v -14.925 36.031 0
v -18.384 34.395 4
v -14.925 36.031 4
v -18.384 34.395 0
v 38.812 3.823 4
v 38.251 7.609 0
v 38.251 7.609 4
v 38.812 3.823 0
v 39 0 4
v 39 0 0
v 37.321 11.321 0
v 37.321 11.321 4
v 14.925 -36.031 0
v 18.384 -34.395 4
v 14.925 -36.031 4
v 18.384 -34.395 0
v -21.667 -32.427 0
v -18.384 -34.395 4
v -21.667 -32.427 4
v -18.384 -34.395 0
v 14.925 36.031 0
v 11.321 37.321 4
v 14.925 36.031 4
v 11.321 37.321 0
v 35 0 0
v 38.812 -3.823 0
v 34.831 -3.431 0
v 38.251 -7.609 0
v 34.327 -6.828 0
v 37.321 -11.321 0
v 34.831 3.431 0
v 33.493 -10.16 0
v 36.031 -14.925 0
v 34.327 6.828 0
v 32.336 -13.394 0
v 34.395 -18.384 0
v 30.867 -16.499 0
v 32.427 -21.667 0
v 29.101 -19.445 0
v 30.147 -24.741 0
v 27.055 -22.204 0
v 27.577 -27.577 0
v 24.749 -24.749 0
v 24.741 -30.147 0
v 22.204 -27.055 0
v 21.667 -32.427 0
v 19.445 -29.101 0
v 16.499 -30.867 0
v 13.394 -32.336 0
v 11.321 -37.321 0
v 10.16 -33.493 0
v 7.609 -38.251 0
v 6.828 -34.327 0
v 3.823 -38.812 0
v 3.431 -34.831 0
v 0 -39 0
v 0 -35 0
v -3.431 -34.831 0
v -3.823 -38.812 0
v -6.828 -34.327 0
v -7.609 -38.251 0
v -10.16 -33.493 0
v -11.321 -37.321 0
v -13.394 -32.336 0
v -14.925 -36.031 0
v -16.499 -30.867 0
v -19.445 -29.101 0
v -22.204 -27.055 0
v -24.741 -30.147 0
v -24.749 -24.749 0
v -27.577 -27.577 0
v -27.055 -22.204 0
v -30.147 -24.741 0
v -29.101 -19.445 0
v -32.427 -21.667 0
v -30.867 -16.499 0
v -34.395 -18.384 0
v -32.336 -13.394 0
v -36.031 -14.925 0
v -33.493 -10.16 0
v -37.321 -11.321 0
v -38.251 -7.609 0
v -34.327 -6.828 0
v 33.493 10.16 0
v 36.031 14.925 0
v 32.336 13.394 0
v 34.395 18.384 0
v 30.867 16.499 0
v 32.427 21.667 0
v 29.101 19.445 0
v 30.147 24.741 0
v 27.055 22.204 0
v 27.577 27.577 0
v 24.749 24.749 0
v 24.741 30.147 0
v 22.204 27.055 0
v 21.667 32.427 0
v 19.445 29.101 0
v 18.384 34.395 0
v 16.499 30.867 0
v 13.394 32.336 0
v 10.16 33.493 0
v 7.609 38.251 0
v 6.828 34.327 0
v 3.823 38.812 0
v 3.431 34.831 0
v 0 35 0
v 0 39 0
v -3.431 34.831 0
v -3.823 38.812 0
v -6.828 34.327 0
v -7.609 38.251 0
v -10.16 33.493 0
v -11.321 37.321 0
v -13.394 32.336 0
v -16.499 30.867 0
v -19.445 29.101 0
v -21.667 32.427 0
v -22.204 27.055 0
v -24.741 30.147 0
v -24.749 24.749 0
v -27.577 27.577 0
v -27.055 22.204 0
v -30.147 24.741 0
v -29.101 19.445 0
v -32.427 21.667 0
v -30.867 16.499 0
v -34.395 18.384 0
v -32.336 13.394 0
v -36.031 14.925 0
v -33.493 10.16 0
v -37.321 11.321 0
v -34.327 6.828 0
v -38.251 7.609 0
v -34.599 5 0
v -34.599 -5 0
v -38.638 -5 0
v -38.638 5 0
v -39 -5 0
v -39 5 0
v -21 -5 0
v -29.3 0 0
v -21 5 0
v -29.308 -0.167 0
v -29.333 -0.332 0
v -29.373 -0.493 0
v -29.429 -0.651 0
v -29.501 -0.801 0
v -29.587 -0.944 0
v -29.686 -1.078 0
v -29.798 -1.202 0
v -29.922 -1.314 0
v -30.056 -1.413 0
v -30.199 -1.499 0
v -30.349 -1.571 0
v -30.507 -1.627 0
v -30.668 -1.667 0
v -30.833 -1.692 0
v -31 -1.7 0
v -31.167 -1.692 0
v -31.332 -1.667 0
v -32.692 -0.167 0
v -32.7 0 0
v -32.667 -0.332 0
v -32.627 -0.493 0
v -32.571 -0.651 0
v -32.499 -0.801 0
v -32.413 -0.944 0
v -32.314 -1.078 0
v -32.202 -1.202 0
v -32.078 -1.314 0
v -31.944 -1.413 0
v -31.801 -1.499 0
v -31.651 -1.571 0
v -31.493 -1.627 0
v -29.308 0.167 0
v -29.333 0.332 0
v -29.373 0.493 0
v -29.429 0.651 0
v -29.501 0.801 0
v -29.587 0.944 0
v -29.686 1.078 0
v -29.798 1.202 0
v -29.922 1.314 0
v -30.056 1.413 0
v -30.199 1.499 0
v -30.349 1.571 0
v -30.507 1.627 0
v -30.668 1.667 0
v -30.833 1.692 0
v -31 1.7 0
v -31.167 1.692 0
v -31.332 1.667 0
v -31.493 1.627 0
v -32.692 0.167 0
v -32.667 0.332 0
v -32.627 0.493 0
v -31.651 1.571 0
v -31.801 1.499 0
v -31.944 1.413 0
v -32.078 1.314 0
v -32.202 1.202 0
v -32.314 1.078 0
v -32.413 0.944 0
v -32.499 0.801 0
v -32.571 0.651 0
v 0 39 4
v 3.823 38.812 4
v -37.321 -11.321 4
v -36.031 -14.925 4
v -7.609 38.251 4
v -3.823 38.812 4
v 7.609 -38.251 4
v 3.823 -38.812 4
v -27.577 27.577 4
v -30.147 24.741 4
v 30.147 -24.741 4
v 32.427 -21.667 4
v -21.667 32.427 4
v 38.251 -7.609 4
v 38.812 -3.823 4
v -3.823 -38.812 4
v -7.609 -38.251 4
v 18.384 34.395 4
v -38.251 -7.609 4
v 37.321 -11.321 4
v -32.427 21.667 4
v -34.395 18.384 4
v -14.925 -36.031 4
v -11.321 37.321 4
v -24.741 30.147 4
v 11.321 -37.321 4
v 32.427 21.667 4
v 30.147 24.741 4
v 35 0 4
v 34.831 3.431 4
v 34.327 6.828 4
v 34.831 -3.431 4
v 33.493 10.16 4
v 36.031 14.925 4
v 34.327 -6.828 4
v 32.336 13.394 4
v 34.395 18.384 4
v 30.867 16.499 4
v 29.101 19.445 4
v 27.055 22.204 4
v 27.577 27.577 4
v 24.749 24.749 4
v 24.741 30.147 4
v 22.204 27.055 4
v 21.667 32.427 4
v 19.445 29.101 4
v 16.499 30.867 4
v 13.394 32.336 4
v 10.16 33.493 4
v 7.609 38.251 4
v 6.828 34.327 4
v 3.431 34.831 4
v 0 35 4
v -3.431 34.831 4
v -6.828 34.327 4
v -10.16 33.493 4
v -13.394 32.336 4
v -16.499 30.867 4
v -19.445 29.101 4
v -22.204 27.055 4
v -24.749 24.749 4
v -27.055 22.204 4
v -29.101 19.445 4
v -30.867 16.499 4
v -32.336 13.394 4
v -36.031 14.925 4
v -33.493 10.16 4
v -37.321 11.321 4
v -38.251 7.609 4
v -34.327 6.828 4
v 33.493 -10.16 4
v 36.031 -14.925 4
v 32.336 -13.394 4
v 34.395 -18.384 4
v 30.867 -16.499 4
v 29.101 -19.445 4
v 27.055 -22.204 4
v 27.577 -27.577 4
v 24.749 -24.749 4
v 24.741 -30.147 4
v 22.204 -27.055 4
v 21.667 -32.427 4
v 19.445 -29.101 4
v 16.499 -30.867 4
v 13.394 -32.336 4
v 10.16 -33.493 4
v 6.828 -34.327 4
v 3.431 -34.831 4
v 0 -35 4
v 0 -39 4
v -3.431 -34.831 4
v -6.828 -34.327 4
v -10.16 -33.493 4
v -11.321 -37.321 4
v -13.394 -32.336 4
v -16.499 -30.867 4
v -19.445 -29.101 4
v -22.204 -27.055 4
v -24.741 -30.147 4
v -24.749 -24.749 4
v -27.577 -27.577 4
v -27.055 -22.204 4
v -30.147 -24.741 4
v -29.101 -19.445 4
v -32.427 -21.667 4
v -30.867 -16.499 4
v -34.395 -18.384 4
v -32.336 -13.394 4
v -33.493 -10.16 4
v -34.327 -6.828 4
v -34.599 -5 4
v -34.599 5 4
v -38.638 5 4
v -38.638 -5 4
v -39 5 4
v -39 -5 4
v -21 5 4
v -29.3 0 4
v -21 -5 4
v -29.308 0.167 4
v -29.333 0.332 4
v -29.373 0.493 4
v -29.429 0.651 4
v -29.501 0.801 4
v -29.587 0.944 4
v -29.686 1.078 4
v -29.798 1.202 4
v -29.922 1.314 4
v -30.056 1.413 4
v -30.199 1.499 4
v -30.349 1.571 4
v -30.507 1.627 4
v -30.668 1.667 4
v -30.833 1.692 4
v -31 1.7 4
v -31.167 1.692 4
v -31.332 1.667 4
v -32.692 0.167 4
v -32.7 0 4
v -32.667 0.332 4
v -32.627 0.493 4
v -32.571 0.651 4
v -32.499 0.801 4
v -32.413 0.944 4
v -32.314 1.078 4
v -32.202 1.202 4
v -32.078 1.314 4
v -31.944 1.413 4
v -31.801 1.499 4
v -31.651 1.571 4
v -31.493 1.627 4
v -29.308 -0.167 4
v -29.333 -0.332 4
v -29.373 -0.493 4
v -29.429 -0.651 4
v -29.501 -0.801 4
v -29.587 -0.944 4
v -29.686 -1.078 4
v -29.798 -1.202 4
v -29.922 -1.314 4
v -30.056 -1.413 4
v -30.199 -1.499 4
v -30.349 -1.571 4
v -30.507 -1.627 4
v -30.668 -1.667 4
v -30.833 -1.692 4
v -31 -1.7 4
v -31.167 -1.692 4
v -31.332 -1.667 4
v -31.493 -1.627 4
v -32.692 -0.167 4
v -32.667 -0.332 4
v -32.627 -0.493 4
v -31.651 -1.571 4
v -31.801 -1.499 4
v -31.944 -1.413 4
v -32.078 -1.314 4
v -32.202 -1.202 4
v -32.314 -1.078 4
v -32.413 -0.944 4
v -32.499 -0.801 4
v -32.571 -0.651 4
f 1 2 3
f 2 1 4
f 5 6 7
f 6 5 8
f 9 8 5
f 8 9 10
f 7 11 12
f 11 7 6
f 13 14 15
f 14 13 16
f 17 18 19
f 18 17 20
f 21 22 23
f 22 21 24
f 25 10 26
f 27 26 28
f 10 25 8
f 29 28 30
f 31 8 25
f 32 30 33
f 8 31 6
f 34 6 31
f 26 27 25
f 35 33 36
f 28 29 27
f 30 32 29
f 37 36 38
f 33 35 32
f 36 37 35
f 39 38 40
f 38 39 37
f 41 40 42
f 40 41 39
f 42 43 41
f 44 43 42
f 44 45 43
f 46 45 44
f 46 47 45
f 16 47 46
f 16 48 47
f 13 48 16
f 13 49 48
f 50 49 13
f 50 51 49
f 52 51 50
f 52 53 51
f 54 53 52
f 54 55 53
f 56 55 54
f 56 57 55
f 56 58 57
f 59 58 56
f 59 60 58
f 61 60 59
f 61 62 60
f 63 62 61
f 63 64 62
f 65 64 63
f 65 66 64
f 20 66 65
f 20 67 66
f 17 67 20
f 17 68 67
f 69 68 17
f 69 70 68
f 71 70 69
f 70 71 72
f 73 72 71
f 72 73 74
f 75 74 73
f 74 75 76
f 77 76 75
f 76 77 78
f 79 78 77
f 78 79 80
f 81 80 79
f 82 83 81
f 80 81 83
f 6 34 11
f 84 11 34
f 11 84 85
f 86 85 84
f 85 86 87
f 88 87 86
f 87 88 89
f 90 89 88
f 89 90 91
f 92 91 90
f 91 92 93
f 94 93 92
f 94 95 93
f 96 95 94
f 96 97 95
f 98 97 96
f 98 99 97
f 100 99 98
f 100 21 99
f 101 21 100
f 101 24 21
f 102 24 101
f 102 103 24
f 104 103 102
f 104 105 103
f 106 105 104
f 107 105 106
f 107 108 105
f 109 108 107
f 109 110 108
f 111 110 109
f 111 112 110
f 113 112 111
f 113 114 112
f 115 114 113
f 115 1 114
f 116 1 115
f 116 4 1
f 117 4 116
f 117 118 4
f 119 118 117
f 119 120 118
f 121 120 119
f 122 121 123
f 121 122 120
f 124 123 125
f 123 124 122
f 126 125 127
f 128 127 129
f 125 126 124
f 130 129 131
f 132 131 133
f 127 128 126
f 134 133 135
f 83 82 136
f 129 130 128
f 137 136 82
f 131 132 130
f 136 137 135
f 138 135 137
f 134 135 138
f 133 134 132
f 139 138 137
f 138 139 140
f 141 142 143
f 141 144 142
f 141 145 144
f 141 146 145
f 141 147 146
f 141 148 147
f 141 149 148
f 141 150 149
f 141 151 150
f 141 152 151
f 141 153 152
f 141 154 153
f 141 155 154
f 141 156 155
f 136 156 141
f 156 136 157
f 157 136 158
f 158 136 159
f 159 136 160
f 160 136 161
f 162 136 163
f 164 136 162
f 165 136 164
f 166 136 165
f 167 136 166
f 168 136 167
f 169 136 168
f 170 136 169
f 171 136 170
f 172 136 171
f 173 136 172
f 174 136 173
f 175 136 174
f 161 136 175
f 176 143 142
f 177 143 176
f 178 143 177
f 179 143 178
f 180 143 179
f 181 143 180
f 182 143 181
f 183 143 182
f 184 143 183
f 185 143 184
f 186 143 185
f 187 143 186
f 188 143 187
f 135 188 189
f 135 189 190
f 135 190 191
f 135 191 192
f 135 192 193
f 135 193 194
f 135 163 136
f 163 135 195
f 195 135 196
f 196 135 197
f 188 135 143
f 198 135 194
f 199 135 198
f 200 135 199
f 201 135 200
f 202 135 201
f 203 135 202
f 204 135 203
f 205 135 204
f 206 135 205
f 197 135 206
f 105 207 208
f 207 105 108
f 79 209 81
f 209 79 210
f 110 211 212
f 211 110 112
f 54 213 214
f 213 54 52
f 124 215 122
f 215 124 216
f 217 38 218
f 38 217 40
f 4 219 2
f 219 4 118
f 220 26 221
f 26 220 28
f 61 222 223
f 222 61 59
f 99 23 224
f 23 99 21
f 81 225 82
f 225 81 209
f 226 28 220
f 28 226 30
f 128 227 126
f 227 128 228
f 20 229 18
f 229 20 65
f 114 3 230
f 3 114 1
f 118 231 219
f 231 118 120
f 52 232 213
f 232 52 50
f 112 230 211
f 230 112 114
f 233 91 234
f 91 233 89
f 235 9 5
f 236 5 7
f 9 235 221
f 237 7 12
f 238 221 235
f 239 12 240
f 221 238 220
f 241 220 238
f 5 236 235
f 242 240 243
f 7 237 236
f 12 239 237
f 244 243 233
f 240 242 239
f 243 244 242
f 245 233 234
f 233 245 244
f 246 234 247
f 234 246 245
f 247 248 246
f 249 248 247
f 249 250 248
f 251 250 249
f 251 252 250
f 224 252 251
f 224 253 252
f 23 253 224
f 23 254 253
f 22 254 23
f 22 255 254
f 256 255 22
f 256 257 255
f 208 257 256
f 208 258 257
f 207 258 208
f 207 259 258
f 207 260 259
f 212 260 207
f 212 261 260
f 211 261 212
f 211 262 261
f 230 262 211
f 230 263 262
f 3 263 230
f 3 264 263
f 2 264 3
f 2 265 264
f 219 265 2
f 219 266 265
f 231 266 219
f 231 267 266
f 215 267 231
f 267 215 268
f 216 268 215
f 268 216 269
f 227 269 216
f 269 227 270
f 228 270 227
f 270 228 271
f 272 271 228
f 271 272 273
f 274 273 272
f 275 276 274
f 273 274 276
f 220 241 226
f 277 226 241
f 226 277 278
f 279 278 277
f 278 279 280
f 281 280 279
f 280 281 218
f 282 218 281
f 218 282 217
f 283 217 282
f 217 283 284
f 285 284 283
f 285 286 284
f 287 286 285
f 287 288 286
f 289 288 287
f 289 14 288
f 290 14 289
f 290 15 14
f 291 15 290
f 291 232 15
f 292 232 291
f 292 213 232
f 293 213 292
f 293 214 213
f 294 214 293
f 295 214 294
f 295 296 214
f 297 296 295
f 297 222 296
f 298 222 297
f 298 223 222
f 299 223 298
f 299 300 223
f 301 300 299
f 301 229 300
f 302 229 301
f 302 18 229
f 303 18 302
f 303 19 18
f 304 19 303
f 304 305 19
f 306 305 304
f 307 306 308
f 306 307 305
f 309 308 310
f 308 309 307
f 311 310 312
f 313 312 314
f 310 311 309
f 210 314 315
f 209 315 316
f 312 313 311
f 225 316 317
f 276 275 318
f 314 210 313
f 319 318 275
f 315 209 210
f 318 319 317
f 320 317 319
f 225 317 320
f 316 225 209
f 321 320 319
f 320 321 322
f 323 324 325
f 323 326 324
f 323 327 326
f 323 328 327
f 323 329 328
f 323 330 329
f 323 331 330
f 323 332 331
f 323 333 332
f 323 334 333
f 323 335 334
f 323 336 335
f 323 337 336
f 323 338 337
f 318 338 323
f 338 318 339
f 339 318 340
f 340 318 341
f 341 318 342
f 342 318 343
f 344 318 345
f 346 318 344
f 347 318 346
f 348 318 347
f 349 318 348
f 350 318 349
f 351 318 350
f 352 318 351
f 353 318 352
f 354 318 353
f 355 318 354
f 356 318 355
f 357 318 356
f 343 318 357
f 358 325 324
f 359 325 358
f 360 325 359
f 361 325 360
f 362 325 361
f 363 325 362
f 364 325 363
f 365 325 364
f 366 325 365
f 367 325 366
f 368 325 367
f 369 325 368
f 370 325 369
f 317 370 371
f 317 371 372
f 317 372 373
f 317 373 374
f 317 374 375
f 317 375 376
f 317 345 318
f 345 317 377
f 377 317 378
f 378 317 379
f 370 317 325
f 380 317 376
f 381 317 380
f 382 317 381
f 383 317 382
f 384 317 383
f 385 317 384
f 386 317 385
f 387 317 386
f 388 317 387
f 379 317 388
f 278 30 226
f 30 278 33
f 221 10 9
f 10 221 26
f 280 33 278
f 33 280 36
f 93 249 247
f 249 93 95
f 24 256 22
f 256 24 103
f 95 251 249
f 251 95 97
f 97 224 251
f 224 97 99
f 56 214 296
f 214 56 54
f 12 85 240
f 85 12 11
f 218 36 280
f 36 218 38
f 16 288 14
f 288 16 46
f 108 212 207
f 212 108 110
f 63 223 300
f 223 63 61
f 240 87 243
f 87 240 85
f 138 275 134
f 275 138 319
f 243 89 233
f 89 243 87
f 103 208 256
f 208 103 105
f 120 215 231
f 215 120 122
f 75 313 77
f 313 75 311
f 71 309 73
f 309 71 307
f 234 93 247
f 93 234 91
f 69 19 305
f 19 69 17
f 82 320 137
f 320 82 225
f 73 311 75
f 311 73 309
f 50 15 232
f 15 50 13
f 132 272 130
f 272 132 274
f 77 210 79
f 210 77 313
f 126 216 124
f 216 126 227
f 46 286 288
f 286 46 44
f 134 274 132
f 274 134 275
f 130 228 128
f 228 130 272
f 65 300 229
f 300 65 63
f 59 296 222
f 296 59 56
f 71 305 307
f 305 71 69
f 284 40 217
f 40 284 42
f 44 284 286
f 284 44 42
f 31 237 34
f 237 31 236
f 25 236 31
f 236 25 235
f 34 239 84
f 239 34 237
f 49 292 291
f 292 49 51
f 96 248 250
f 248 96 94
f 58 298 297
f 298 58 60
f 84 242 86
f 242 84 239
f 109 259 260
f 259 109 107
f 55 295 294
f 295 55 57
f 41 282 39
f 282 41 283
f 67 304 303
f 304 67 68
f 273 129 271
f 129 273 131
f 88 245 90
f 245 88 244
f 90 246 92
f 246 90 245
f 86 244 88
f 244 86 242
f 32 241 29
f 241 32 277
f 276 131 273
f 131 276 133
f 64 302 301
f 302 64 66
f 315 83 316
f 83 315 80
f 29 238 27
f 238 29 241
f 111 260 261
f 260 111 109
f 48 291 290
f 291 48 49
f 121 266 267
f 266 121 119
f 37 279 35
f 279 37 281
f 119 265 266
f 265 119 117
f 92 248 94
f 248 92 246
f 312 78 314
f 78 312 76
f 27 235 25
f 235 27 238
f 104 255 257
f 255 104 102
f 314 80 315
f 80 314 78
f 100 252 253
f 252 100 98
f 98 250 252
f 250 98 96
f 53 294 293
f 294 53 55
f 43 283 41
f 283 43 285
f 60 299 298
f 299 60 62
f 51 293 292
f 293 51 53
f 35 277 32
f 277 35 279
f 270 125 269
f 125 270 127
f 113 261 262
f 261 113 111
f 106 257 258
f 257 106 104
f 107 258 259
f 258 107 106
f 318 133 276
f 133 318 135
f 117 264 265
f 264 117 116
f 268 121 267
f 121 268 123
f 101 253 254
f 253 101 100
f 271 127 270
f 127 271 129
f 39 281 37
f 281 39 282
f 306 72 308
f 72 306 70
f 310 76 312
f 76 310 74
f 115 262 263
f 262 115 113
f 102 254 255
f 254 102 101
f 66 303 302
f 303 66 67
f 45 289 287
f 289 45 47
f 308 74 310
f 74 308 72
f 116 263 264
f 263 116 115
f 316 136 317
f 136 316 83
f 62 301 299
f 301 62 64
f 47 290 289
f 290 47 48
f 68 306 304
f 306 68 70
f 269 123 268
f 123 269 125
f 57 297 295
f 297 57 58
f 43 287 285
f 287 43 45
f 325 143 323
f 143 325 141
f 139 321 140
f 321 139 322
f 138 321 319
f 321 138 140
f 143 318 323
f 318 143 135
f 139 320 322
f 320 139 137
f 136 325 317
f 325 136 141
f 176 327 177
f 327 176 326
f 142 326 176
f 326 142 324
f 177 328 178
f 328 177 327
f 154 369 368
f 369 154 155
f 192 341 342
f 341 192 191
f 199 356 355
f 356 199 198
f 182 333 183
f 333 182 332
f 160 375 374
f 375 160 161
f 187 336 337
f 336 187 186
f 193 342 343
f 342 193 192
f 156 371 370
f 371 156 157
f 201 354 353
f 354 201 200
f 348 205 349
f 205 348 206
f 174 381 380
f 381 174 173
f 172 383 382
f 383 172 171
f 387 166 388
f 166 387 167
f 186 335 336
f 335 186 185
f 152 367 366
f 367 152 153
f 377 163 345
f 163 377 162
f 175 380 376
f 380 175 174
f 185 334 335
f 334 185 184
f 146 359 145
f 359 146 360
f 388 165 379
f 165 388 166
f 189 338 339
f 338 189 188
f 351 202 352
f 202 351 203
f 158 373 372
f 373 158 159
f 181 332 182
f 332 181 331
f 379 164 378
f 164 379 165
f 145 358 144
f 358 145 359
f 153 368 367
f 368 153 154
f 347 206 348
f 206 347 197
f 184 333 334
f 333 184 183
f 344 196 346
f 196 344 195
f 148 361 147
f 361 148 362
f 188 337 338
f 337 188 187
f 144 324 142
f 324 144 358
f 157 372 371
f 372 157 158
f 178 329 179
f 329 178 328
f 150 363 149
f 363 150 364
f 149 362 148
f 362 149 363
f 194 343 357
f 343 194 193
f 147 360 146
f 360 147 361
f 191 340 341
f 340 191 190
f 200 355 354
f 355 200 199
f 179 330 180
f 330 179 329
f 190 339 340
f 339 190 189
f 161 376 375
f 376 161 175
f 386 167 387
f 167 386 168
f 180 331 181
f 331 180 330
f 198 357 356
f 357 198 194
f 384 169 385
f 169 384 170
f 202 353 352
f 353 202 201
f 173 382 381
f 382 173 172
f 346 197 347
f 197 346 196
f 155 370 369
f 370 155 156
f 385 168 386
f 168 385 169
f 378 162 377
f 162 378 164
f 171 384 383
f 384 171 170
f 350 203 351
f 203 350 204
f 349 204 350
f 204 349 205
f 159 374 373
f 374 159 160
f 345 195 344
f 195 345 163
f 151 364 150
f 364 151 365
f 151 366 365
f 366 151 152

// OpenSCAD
// UNG-CAD compact observation quad — optional prop guard
// Print four. Fits within 215 mm rule. Generic geometry pending exact prop/motor selection.
$fn=64;
outer_d=78;
inner_d=70;
ring_h=4;
mount_d=3.4;
difference(){
 union(){
  difference(){
   cylinder(d=outer_d,h=ring_h);
   translate([0,0,-1]) cylinder(d=inner_d,h=ring_h+2);
  }
  translate([-outer_d/2, -5,0]) cube([18,10,ring_h]);
 }
 translate([-outer_d/2+8,0,-1]) cylinder(d=mount_d,h=ring_h+2);
}
